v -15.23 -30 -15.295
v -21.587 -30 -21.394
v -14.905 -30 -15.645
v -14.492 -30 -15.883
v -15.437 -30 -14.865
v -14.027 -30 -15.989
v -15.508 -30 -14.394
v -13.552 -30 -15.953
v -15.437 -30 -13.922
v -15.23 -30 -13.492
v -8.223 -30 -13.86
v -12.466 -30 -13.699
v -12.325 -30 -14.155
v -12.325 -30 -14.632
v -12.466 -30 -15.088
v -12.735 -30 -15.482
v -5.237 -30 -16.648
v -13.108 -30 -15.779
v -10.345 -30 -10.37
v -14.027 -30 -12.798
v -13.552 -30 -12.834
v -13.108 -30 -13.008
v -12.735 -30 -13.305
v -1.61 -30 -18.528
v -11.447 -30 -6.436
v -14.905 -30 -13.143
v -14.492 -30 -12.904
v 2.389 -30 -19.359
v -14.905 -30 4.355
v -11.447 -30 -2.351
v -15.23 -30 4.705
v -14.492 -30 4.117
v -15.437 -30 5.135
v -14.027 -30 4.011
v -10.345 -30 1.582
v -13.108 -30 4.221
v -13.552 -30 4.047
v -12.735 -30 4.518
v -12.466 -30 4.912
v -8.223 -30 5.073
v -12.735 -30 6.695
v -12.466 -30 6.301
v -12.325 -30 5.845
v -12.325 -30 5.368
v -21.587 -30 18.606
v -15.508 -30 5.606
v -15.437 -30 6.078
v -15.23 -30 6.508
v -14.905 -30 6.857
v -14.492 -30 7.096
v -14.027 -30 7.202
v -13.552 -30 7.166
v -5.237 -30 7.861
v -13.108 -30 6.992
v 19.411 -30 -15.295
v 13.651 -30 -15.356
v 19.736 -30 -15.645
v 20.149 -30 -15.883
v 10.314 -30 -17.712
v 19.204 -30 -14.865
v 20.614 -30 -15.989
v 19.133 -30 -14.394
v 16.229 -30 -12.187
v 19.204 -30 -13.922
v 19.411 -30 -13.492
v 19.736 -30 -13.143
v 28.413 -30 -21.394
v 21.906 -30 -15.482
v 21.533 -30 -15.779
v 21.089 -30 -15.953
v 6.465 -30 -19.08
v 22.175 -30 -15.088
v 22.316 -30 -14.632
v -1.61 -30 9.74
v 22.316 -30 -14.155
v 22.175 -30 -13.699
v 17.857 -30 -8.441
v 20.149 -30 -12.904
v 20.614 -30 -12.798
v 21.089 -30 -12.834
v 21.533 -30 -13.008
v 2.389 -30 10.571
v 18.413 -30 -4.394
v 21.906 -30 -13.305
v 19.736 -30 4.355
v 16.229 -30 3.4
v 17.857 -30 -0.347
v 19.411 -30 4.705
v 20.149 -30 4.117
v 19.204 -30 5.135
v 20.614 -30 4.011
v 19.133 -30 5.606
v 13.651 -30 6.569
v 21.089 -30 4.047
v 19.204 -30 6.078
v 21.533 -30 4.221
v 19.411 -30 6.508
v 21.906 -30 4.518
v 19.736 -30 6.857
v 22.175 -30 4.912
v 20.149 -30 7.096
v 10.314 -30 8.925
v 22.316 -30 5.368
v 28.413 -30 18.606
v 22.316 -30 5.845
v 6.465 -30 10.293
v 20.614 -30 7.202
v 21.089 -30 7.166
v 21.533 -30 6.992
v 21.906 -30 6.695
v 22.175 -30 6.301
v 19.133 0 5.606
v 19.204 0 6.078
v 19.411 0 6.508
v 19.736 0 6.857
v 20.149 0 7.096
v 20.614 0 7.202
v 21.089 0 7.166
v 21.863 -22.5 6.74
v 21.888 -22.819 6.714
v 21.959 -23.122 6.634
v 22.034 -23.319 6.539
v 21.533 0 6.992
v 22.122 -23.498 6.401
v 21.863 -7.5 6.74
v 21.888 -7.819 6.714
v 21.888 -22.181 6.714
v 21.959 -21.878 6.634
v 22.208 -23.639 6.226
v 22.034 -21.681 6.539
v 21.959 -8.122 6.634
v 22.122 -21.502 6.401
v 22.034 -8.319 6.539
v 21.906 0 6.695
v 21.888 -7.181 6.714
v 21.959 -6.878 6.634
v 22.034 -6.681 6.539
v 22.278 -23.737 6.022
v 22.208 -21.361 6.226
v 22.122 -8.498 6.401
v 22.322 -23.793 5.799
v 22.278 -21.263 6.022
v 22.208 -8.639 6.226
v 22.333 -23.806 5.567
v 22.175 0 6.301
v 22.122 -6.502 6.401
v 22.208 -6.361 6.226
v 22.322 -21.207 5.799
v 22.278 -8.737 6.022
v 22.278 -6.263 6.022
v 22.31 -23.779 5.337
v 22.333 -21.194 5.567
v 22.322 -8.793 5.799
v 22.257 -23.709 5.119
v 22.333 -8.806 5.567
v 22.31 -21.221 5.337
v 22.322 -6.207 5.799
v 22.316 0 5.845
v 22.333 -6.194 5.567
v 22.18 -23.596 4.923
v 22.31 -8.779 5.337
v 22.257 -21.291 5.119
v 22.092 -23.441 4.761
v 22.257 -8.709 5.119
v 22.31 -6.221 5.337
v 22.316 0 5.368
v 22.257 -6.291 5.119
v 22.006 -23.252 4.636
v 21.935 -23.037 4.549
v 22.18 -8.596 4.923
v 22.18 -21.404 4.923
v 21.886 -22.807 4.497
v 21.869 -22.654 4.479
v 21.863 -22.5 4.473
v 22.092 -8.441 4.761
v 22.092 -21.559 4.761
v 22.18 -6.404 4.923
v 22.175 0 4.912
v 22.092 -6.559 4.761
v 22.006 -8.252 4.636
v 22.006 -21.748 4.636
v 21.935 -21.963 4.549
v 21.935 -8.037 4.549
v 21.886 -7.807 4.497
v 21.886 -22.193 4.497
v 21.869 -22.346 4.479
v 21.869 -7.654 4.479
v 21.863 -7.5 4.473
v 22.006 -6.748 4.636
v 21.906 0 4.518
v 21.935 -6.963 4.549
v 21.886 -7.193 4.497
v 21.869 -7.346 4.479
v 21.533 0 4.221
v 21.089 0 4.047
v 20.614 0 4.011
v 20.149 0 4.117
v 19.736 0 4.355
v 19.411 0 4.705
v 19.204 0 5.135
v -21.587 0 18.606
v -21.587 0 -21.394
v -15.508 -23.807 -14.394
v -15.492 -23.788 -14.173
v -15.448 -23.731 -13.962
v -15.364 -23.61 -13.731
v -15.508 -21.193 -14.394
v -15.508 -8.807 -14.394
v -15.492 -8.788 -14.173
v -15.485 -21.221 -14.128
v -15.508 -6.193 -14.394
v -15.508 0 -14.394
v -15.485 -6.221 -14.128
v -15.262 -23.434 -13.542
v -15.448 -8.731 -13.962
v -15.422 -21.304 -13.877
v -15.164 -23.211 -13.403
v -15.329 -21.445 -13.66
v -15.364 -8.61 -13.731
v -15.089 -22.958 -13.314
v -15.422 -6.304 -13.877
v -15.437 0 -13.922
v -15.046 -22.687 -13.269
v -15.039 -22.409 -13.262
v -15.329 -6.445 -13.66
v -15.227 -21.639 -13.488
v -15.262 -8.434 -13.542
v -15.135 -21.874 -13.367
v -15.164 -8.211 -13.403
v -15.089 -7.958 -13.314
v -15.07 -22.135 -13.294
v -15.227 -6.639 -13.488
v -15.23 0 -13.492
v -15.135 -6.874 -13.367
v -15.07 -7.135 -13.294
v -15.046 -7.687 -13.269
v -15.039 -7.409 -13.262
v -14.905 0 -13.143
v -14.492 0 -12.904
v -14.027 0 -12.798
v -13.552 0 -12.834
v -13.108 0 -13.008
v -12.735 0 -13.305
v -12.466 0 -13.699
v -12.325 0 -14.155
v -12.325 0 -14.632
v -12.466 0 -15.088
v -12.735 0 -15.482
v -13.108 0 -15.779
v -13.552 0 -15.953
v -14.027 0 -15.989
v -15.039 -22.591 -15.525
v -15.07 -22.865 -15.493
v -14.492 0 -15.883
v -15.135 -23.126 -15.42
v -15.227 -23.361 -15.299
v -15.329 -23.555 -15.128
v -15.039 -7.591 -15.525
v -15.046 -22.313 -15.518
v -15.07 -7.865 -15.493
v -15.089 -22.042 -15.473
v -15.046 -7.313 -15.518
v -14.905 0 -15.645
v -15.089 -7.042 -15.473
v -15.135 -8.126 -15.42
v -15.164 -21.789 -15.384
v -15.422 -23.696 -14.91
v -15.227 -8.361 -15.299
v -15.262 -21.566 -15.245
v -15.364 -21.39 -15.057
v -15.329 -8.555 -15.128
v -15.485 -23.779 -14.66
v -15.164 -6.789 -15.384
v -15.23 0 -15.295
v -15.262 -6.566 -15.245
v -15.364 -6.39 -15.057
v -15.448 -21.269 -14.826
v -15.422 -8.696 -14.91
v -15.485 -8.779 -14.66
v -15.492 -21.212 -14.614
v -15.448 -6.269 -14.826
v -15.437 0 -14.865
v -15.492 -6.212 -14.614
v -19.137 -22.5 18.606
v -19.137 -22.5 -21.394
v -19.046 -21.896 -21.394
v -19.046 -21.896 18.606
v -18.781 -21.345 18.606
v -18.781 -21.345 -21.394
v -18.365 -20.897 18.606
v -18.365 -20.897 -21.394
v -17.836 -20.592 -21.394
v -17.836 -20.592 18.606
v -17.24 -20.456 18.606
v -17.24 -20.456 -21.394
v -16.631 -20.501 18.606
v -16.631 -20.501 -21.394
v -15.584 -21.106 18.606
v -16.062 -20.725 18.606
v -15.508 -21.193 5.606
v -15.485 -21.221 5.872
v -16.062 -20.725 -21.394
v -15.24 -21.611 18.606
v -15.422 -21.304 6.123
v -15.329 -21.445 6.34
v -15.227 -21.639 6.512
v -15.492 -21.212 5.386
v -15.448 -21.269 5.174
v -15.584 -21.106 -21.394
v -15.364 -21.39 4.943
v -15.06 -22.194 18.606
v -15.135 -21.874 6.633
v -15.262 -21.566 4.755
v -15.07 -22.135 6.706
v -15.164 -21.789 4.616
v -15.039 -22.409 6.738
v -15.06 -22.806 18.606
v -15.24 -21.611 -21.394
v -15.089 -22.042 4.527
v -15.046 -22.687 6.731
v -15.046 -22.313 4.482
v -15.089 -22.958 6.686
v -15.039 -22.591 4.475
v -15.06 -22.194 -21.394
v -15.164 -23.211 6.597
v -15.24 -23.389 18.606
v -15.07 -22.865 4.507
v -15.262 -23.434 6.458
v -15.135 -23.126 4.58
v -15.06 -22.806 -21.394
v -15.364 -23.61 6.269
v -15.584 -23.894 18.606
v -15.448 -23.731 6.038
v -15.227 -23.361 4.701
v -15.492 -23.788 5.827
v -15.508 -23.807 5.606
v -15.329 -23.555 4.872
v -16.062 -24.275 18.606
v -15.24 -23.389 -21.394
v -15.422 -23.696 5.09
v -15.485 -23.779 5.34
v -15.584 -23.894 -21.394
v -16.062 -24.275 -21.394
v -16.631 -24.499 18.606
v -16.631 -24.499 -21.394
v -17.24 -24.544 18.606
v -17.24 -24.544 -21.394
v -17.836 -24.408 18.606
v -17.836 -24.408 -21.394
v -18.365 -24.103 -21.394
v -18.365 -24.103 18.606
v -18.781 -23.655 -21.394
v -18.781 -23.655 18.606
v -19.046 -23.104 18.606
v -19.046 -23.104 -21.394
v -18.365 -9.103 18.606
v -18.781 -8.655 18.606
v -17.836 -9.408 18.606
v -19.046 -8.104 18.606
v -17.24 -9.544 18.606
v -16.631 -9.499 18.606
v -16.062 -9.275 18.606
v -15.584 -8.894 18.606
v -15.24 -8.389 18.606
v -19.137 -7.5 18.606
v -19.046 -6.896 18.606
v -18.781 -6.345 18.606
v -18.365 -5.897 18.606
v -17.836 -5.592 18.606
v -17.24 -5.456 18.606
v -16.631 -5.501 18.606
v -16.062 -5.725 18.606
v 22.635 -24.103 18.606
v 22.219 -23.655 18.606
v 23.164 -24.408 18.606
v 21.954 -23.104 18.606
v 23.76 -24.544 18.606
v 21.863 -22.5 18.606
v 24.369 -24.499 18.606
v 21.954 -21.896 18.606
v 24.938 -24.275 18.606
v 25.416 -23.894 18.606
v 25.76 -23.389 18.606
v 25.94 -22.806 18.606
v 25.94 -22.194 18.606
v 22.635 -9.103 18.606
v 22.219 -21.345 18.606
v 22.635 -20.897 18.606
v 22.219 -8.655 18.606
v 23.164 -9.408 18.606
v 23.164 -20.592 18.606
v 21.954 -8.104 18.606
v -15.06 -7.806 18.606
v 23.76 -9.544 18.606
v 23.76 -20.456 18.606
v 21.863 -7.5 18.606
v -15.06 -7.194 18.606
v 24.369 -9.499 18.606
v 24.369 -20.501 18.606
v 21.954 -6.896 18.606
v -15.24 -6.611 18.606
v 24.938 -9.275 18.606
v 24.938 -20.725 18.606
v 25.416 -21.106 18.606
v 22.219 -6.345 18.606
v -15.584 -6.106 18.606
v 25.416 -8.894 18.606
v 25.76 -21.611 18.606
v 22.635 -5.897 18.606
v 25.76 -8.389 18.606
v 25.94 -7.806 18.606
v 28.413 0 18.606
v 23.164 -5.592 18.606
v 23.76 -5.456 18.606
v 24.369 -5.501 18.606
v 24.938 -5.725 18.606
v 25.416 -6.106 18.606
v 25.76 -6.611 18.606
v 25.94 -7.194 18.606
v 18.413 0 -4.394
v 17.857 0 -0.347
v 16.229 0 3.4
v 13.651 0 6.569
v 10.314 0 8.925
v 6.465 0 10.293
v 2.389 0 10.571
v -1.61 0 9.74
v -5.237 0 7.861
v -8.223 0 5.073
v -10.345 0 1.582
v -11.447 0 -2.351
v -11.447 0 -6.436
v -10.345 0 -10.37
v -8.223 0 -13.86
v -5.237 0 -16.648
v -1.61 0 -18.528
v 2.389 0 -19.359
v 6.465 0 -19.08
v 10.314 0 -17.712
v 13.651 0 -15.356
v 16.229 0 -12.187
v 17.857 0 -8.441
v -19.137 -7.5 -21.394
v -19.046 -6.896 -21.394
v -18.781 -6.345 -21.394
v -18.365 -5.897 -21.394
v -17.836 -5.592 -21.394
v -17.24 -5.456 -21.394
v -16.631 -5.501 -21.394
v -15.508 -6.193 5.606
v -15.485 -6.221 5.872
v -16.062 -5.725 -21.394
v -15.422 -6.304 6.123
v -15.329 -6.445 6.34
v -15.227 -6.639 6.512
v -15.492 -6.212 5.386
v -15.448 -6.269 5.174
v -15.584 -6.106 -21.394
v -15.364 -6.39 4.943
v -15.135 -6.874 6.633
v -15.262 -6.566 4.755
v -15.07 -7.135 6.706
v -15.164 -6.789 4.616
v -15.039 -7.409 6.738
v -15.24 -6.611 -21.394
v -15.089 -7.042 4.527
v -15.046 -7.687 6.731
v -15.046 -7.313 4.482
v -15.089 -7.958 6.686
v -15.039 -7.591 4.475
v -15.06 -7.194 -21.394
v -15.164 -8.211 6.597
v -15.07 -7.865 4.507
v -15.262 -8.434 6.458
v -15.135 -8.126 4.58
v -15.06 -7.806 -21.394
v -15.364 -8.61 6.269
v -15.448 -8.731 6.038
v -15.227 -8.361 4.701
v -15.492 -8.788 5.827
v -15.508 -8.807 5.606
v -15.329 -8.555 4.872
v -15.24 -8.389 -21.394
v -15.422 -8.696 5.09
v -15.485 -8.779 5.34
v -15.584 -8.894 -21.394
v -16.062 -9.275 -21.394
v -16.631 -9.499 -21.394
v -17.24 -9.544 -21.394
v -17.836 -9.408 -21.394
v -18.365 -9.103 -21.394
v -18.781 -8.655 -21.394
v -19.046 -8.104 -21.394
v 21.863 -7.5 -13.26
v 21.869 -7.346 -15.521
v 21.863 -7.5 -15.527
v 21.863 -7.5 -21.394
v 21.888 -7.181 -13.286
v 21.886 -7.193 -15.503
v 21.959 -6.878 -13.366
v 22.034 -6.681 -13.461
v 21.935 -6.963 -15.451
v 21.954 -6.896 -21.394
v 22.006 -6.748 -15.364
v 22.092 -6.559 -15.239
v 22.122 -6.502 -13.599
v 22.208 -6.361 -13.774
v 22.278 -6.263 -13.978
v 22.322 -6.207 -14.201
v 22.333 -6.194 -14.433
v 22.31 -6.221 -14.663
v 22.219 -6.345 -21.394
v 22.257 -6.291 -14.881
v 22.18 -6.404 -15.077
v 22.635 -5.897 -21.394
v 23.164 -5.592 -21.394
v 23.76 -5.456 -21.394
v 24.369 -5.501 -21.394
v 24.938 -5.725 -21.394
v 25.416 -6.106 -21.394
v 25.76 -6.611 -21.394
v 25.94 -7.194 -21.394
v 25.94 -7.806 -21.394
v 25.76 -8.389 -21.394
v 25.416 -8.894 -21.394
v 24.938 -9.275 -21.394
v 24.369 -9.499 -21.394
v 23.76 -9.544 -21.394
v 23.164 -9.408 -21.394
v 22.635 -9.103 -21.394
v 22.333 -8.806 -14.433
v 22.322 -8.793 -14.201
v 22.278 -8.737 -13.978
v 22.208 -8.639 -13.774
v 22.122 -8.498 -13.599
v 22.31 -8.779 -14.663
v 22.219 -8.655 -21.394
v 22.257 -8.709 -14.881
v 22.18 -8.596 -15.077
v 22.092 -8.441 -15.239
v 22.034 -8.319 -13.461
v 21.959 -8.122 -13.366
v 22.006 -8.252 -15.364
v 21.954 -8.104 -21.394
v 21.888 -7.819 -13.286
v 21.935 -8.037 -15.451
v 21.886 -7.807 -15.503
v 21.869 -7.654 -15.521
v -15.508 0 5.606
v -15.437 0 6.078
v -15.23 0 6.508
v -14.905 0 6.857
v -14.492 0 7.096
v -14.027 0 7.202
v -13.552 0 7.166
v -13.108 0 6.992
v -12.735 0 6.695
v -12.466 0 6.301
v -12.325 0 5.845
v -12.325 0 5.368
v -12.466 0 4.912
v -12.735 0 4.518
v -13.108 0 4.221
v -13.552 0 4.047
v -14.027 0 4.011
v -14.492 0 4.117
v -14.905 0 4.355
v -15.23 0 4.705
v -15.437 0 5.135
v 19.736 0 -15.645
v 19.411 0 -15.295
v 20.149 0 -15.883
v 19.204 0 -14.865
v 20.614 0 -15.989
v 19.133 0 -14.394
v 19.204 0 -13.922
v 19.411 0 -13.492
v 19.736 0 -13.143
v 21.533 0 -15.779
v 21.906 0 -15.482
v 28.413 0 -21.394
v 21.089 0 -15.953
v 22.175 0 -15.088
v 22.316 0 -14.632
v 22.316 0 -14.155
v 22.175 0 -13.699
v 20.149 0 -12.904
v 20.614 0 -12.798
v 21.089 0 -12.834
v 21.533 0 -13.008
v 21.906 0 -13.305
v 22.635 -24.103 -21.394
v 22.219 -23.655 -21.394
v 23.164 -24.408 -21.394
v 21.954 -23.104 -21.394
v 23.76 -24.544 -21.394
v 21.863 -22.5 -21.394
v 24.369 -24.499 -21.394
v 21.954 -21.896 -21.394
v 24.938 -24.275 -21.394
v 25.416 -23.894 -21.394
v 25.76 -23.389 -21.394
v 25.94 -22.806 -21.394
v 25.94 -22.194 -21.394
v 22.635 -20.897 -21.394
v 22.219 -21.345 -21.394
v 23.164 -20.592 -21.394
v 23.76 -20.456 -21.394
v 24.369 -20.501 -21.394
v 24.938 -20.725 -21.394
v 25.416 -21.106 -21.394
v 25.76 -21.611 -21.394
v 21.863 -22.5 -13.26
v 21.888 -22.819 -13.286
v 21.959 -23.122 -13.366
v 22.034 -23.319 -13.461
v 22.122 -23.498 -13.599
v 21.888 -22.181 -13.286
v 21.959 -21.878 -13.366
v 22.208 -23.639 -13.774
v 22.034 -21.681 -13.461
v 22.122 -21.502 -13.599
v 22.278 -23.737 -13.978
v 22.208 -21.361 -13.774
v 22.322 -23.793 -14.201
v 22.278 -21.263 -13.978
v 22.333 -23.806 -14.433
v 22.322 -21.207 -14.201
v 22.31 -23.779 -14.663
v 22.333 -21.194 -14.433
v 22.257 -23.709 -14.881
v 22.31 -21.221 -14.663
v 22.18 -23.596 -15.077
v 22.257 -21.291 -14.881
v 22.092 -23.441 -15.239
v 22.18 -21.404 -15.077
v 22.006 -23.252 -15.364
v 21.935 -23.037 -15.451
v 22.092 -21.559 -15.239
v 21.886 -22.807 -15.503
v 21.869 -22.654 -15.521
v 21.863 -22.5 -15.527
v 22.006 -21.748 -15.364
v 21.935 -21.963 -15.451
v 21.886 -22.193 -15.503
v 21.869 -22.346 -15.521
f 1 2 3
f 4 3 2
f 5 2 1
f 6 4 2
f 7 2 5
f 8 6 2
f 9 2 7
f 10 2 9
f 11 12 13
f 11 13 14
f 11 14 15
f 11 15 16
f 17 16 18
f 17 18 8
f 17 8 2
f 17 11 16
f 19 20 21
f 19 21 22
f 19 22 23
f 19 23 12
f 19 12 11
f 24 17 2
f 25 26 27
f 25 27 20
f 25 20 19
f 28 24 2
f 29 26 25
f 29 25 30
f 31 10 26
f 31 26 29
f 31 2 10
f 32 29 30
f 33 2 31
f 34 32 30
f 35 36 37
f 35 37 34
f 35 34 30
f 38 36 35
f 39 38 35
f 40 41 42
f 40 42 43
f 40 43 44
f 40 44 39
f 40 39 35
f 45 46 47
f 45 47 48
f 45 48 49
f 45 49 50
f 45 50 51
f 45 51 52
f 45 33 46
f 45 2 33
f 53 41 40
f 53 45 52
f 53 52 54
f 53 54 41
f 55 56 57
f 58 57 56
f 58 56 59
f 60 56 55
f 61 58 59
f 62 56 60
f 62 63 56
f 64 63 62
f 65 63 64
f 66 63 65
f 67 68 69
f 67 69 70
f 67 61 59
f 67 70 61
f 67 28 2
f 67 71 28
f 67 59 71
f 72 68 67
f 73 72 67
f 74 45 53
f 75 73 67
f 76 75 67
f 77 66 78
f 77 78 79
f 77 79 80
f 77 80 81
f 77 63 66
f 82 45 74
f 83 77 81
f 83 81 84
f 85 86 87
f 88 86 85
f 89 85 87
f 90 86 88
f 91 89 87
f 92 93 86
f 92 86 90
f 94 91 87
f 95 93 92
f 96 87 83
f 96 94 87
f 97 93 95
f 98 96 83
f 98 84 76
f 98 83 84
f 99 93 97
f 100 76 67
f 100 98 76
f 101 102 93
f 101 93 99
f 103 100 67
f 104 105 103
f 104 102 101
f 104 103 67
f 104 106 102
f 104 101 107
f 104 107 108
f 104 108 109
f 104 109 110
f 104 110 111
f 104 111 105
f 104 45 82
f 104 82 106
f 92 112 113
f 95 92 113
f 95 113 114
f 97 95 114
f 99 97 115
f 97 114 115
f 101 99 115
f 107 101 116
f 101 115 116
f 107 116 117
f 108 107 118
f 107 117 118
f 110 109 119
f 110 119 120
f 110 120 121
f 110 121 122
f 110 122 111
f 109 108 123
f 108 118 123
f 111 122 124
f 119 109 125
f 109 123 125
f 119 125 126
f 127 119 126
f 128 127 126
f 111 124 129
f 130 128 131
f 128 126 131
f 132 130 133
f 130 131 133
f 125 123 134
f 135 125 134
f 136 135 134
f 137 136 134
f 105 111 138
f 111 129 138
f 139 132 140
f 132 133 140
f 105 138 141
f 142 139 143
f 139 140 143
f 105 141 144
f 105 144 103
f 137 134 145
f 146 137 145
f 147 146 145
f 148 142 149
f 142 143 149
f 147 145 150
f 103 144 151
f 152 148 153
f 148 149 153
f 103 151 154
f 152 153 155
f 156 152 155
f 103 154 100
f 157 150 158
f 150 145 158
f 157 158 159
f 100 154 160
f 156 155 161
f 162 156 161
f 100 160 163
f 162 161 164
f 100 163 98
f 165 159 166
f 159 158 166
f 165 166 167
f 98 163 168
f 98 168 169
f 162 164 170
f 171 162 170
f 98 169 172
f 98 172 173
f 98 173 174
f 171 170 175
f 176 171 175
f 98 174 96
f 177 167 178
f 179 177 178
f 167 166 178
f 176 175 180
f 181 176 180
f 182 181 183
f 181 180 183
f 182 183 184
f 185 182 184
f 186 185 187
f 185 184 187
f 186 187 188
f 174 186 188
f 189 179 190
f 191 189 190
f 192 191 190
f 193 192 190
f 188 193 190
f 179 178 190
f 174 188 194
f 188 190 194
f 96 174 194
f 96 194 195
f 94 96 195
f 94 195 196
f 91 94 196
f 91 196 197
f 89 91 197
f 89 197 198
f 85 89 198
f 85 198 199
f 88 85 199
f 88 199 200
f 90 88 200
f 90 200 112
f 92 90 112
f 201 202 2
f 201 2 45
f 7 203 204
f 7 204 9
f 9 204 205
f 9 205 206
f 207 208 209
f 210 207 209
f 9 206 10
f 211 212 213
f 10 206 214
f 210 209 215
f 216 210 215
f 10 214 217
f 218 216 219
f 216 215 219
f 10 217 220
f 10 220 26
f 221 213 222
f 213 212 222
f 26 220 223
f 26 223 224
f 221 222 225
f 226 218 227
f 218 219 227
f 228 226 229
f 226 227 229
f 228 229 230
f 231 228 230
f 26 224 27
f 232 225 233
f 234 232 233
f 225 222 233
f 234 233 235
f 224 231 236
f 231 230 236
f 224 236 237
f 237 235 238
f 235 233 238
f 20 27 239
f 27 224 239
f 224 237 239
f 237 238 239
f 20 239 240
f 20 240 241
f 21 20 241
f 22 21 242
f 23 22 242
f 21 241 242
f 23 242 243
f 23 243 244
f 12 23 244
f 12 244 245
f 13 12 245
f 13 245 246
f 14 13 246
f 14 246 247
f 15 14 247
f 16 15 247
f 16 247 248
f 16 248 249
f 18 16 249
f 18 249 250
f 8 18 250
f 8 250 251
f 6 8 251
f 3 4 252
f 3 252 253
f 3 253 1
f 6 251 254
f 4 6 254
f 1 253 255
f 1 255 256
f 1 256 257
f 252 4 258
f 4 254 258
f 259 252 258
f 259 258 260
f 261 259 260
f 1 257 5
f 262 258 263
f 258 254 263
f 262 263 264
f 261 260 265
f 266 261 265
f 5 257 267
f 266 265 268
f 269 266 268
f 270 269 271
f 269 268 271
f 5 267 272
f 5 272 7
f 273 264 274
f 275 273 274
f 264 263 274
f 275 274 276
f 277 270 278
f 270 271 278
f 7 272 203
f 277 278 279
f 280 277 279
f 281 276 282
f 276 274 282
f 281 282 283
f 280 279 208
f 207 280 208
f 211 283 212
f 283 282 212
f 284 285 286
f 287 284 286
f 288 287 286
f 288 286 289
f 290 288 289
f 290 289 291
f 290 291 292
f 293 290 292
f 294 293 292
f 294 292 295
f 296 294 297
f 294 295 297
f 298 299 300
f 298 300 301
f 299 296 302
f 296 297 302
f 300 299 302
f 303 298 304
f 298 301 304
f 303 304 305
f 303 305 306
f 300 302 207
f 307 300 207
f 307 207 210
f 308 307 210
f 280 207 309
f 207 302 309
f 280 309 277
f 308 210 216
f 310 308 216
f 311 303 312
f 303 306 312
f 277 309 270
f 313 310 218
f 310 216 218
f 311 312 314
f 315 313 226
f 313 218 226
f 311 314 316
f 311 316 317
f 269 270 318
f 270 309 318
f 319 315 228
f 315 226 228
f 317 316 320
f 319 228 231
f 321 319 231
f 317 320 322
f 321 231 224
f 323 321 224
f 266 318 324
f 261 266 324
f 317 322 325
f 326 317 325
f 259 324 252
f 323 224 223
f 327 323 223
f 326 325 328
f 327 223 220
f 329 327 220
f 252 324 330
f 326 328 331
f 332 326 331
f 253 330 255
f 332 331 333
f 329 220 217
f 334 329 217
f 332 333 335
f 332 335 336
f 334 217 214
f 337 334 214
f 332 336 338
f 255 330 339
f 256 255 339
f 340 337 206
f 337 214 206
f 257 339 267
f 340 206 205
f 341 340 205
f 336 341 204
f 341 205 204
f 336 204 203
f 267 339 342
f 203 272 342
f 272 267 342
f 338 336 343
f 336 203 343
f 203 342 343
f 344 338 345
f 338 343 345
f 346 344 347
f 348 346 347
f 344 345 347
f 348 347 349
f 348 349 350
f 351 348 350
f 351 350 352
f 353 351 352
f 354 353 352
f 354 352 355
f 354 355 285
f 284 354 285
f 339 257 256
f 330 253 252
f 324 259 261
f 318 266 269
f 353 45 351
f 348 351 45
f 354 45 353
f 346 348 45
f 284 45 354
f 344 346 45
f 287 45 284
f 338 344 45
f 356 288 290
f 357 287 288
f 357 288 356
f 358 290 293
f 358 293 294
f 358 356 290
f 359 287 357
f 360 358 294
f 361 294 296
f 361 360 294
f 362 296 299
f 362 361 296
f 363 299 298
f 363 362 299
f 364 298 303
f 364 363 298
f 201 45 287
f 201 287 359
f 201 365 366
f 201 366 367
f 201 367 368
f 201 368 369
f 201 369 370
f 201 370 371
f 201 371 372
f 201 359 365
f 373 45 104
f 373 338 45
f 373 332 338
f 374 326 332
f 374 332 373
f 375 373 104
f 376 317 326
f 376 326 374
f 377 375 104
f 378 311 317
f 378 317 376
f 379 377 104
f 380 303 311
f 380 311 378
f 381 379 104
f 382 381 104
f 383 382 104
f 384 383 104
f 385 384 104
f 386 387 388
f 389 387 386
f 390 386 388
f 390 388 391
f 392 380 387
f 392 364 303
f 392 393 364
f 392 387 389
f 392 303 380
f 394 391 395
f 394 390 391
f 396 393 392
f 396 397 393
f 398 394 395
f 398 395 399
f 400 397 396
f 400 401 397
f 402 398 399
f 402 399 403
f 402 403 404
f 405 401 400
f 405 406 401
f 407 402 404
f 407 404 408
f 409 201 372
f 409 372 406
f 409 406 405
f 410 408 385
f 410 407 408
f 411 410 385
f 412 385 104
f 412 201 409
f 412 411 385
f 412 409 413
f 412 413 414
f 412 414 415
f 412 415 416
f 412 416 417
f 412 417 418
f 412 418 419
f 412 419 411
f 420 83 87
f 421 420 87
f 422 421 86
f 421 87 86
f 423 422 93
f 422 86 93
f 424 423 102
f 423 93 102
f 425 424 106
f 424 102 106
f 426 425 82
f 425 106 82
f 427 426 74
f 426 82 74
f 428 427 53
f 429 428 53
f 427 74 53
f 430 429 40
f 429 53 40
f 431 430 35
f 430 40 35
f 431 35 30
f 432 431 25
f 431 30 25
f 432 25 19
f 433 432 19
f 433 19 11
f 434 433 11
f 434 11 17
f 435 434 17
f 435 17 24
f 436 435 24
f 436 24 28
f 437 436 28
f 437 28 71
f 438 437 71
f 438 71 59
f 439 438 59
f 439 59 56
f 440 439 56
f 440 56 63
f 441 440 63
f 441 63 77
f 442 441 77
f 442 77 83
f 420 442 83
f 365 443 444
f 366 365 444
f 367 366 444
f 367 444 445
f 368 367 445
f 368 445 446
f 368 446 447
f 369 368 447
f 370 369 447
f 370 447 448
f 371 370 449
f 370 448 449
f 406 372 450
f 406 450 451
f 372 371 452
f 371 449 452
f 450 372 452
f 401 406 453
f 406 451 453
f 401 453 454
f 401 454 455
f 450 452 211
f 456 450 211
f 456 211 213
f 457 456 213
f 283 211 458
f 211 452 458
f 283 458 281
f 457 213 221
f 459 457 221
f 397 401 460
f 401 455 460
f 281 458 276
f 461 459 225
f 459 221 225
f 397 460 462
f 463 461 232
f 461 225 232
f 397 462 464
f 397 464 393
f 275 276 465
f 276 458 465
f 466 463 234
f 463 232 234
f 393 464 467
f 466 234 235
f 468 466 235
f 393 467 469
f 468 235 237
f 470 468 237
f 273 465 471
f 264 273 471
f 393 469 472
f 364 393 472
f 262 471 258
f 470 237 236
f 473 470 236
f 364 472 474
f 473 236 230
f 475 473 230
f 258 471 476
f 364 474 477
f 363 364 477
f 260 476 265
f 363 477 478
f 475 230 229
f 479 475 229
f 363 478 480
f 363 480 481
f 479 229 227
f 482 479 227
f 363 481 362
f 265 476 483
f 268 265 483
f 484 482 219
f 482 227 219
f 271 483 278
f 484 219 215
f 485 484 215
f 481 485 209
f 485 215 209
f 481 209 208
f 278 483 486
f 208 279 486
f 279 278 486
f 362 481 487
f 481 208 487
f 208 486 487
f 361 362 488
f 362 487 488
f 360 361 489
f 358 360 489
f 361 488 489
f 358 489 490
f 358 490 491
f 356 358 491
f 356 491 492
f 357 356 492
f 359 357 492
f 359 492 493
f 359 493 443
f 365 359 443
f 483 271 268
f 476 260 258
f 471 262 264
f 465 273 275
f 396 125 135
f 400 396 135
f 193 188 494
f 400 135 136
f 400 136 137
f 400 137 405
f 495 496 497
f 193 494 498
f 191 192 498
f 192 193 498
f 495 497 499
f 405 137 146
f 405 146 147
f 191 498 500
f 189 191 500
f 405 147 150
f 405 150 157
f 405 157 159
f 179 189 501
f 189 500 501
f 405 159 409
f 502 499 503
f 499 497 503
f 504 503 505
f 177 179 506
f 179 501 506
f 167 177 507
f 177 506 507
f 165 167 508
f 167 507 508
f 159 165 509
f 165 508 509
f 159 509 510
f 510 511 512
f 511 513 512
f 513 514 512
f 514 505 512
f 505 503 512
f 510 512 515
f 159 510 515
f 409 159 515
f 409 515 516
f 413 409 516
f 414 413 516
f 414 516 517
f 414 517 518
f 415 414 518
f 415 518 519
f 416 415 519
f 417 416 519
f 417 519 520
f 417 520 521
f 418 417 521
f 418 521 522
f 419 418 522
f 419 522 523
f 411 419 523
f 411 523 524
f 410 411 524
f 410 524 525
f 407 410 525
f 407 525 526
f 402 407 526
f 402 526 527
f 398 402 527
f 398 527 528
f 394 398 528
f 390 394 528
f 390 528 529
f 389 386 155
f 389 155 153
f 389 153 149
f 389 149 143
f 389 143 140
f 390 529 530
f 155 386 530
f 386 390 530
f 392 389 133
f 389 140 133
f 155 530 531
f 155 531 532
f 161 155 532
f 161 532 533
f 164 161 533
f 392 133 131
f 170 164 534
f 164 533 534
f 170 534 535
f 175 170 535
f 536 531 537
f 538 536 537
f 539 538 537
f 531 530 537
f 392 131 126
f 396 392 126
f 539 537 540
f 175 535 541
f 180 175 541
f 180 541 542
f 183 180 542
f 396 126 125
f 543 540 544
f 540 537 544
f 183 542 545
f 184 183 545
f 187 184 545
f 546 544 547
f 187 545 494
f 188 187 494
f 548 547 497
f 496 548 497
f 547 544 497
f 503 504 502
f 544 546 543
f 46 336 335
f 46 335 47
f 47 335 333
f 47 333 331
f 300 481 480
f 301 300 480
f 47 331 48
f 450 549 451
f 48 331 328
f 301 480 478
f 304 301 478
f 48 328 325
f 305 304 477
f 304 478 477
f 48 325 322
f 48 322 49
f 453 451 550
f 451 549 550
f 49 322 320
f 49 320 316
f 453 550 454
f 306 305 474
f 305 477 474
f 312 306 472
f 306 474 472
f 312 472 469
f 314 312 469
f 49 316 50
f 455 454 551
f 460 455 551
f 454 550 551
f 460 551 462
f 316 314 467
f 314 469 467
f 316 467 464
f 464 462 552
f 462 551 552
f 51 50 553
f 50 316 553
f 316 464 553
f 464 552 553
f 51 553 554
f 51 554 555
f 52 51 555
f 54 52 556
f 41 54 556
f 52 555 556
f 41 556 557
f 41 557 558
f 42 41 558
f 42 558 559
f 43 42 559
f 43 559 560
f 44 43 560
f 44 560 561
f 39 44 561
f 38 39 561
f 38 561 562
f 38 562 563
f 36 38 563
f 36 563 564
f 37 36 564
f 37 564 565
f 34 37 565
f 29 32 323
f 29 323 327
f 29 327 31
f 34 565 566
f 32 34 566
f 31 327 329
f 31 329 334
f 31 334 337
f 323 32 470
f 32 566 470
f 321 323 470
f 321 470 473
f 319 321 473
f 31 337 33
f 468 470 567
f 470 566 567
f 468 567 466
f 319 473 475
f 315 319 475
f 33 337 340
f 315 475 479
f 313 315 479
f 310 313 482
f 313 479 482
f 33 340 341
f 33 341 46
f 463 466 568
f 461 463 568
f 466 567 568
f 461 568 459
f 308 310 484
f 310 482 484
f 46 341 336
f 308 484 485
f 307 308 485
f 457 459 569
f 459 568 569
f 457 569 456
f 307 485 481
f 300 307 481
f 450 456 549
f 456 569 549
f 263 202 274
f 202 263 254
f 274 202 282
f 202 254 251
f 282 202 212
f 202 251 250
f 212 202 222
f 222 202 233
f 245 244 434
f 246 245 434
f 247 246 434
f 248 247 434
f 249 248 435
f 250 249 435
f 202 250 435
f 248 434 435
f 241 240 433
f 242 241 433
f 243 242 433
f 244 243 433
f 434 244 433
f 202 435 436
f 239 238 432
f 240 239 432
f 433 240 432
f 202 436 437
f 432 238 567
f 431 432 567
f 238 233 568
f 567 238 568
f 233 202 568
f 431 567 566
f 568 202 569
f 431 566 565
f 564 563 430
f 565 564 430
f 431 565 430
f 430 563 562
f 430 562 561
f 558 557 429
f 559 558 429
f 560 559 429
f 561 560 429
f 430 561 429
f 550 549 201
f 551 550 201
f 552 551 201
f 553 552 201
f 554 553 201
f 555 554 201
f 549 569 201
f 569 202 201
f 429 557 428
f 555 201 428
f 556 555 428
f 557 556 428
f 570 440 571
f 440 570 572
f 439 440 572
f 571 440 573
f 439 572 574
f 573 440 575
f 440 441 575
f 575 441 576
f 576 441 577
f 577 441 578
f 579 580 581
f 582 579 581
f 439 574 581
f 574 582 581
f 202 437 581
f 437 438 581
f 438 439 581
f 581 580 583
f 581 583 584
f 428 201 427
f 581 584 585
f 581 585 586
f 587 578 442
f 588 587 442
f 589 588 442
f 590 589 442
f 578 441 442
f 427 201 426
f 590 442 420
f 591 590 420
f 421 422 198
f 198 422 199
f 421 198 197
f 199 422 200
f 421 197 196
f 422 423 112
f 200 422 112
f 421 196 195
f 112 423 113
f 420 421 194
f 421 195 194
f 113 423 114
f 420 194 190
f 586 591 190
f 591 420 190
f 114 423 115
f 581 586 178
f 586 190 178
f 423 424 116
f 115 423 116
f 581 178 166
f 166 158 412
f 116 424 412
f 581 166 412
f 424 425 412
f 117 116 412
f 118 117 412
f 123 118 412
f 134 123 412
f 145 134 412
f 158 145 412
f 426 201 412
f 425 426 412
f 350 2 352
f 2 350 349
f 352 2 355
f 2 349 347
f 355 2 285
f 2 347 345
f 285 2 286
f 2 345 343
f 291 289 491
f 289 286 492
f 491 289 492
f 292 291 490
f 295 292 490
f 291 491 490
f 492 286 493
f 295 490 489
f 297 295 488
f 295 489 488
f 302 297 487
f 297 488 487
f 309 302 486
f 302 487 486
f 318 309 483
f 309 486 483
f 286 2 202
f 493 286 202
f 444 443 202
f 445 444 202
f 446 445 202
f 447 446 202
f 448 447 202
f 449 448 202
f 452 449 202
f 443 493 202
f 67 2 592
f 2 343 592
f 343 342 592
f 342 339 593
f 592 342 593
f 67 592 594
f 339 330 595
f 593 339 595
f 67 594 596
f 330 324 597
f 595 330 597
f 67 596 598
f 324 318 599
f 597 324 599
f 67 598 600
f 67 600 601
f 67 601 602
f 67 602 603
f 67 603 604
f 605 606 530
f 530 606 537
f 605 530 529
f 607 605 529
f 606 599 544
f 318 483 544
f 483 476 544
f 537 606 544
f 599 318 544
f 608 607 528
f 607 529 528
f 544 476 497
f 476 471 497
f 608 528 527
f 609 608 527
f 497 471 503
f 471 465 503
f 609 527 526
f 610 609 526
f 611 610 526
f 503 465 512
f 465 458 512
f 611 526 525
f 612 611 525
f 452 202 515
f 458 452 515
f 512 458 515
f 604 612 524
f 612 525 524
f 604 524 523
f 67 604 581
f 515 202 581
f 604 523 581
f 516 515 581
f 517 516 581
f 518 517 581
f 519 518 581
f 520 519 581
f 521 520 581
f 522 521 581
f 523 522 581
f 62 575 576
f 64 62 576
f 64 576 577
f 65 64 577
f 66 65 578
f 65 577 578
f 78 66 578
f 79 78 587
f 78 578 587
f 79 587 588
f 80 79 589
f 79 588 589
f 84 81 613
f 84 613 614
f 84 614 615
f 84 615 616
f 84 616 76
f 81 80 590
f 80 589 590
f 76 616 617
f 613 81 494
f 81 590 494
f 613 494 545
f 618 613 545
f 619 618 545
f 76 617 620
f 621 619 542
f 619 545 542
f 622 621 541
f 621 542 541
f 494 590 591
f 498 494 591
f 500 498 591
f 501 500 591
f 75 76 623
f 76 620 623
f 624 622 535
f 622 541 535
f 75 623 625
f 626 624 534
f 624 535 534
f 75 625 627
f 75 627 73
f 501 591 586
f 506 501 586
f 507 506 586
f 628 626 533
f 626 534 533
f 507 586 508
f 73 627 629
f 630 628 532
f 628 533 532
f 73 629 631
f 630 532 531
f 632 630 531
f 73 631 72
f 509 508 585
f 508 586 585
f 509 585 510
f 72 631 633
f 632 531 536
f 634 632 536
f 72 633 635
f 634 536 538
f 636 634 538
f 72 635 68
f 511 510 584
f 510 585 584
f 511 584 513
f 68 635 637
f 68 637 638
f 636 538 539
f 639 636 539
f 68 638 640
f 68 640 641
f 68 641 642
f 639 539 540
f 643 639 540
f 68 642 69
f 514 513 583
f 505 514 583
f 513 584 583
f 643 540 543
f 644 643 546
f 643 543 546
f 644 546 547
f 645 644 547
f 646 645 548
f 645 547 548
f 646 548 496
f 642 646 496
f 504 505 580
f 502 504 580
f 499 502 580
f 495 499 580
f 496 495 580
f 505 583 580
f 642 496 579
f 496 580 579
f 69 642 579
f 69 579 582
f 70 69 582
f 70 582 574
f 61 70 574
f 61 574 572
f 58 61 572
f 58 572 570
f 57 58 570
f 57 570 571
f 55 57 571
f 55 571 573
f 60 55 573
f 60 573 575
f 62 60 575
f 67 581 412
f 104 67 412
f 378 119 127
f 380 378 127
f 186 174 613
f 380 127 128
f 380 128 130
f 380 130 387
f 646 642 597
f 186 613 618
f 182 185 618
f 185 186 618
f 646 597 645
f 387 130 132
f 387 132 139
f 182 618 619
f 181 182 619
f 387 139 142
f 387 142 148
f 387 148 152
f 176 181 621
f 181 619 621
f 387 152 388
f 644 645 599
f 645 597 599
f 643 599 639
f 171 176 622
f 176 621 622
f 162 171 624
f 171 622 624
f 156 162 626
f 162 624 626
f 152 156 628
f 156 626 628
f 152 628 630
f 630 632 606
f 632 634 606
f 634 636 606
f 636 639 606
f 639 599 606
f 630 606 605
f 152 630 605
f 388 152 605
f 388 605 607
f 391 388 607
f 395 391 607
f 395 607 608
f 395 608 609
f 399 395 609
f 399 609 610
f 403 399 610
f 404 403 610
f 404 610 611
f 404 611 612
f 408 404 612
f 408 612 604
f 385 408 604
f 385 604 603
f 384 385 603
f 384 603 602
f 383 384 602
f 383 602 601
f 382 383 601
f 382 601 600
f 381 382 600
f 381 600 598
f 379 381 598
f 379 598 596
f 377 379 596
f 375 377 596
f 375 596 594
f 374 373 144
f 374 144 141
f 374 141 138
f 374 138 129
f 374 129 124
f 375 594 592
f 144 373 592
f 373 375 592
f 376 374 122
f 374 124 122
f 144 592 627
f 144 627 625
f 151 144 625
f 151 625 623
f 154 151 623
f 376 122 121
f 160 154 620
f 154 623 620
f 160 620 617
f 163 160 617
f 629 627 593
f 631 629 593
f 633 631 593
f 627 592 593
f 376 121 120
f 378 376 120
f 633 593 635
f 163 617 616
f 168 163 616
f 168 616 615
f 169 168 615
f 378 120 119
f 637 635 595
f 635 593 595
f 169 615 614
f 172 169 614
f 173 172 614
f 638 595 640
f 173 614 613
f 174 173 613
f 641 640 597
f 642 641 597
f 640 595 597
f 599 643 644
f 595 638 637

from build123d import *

# Parameters (mm, degrees)
F0_W     = 50
F0_H     = 40
F1_DEPTH = 30
F2_R     = 15
F3_DEPTH = 30.001
F4_D     = 3.2
F6_D     = 4.1


# Not quite as in the source:
# - a feature names something its author has since deleted; it is built from what else it names


with BuildPart() as f1:
    # F0 (on Front) → F1 (new body)
    with BuildSketch(Plane.XZ):
        with Locations((3.412880823, -1.3936108311)):
            Rectangle(F0_W, F0_H)
    extrude(amount=F1_DEPTH)

    # F2 (on face) → F3 (cut, through all)
    with BuildSketch(Plane.XZ.offset(30)):
        with Locations((3.412880823, -4.3936108311)):
            Circle(F2_R)
    extrude(amount=-F3_DEPTH, mode=Mode.SUBTRACT)

    # F4 (through all)
    with Locations(Plane.XZ.offset(30)):
        with Locations((-13.9076272527, -14.3936108311), (-13.9076272527, 5.6063891689), (20.7333888987, 5.6063891689), (20.7333888987, -14.3936108311)):
            Hole(F4_D / 2)

    # F6 (through all)
    with Locations(Plane.XY.offset(18.6063891689)):
        with Locations((23.912880823, -22.5), (23.912880823, -7.5), (-17.087119177, -7.5), (-17.087119177, -22.5)):
            Hole(F6_D / 2)


solid = f1.part
